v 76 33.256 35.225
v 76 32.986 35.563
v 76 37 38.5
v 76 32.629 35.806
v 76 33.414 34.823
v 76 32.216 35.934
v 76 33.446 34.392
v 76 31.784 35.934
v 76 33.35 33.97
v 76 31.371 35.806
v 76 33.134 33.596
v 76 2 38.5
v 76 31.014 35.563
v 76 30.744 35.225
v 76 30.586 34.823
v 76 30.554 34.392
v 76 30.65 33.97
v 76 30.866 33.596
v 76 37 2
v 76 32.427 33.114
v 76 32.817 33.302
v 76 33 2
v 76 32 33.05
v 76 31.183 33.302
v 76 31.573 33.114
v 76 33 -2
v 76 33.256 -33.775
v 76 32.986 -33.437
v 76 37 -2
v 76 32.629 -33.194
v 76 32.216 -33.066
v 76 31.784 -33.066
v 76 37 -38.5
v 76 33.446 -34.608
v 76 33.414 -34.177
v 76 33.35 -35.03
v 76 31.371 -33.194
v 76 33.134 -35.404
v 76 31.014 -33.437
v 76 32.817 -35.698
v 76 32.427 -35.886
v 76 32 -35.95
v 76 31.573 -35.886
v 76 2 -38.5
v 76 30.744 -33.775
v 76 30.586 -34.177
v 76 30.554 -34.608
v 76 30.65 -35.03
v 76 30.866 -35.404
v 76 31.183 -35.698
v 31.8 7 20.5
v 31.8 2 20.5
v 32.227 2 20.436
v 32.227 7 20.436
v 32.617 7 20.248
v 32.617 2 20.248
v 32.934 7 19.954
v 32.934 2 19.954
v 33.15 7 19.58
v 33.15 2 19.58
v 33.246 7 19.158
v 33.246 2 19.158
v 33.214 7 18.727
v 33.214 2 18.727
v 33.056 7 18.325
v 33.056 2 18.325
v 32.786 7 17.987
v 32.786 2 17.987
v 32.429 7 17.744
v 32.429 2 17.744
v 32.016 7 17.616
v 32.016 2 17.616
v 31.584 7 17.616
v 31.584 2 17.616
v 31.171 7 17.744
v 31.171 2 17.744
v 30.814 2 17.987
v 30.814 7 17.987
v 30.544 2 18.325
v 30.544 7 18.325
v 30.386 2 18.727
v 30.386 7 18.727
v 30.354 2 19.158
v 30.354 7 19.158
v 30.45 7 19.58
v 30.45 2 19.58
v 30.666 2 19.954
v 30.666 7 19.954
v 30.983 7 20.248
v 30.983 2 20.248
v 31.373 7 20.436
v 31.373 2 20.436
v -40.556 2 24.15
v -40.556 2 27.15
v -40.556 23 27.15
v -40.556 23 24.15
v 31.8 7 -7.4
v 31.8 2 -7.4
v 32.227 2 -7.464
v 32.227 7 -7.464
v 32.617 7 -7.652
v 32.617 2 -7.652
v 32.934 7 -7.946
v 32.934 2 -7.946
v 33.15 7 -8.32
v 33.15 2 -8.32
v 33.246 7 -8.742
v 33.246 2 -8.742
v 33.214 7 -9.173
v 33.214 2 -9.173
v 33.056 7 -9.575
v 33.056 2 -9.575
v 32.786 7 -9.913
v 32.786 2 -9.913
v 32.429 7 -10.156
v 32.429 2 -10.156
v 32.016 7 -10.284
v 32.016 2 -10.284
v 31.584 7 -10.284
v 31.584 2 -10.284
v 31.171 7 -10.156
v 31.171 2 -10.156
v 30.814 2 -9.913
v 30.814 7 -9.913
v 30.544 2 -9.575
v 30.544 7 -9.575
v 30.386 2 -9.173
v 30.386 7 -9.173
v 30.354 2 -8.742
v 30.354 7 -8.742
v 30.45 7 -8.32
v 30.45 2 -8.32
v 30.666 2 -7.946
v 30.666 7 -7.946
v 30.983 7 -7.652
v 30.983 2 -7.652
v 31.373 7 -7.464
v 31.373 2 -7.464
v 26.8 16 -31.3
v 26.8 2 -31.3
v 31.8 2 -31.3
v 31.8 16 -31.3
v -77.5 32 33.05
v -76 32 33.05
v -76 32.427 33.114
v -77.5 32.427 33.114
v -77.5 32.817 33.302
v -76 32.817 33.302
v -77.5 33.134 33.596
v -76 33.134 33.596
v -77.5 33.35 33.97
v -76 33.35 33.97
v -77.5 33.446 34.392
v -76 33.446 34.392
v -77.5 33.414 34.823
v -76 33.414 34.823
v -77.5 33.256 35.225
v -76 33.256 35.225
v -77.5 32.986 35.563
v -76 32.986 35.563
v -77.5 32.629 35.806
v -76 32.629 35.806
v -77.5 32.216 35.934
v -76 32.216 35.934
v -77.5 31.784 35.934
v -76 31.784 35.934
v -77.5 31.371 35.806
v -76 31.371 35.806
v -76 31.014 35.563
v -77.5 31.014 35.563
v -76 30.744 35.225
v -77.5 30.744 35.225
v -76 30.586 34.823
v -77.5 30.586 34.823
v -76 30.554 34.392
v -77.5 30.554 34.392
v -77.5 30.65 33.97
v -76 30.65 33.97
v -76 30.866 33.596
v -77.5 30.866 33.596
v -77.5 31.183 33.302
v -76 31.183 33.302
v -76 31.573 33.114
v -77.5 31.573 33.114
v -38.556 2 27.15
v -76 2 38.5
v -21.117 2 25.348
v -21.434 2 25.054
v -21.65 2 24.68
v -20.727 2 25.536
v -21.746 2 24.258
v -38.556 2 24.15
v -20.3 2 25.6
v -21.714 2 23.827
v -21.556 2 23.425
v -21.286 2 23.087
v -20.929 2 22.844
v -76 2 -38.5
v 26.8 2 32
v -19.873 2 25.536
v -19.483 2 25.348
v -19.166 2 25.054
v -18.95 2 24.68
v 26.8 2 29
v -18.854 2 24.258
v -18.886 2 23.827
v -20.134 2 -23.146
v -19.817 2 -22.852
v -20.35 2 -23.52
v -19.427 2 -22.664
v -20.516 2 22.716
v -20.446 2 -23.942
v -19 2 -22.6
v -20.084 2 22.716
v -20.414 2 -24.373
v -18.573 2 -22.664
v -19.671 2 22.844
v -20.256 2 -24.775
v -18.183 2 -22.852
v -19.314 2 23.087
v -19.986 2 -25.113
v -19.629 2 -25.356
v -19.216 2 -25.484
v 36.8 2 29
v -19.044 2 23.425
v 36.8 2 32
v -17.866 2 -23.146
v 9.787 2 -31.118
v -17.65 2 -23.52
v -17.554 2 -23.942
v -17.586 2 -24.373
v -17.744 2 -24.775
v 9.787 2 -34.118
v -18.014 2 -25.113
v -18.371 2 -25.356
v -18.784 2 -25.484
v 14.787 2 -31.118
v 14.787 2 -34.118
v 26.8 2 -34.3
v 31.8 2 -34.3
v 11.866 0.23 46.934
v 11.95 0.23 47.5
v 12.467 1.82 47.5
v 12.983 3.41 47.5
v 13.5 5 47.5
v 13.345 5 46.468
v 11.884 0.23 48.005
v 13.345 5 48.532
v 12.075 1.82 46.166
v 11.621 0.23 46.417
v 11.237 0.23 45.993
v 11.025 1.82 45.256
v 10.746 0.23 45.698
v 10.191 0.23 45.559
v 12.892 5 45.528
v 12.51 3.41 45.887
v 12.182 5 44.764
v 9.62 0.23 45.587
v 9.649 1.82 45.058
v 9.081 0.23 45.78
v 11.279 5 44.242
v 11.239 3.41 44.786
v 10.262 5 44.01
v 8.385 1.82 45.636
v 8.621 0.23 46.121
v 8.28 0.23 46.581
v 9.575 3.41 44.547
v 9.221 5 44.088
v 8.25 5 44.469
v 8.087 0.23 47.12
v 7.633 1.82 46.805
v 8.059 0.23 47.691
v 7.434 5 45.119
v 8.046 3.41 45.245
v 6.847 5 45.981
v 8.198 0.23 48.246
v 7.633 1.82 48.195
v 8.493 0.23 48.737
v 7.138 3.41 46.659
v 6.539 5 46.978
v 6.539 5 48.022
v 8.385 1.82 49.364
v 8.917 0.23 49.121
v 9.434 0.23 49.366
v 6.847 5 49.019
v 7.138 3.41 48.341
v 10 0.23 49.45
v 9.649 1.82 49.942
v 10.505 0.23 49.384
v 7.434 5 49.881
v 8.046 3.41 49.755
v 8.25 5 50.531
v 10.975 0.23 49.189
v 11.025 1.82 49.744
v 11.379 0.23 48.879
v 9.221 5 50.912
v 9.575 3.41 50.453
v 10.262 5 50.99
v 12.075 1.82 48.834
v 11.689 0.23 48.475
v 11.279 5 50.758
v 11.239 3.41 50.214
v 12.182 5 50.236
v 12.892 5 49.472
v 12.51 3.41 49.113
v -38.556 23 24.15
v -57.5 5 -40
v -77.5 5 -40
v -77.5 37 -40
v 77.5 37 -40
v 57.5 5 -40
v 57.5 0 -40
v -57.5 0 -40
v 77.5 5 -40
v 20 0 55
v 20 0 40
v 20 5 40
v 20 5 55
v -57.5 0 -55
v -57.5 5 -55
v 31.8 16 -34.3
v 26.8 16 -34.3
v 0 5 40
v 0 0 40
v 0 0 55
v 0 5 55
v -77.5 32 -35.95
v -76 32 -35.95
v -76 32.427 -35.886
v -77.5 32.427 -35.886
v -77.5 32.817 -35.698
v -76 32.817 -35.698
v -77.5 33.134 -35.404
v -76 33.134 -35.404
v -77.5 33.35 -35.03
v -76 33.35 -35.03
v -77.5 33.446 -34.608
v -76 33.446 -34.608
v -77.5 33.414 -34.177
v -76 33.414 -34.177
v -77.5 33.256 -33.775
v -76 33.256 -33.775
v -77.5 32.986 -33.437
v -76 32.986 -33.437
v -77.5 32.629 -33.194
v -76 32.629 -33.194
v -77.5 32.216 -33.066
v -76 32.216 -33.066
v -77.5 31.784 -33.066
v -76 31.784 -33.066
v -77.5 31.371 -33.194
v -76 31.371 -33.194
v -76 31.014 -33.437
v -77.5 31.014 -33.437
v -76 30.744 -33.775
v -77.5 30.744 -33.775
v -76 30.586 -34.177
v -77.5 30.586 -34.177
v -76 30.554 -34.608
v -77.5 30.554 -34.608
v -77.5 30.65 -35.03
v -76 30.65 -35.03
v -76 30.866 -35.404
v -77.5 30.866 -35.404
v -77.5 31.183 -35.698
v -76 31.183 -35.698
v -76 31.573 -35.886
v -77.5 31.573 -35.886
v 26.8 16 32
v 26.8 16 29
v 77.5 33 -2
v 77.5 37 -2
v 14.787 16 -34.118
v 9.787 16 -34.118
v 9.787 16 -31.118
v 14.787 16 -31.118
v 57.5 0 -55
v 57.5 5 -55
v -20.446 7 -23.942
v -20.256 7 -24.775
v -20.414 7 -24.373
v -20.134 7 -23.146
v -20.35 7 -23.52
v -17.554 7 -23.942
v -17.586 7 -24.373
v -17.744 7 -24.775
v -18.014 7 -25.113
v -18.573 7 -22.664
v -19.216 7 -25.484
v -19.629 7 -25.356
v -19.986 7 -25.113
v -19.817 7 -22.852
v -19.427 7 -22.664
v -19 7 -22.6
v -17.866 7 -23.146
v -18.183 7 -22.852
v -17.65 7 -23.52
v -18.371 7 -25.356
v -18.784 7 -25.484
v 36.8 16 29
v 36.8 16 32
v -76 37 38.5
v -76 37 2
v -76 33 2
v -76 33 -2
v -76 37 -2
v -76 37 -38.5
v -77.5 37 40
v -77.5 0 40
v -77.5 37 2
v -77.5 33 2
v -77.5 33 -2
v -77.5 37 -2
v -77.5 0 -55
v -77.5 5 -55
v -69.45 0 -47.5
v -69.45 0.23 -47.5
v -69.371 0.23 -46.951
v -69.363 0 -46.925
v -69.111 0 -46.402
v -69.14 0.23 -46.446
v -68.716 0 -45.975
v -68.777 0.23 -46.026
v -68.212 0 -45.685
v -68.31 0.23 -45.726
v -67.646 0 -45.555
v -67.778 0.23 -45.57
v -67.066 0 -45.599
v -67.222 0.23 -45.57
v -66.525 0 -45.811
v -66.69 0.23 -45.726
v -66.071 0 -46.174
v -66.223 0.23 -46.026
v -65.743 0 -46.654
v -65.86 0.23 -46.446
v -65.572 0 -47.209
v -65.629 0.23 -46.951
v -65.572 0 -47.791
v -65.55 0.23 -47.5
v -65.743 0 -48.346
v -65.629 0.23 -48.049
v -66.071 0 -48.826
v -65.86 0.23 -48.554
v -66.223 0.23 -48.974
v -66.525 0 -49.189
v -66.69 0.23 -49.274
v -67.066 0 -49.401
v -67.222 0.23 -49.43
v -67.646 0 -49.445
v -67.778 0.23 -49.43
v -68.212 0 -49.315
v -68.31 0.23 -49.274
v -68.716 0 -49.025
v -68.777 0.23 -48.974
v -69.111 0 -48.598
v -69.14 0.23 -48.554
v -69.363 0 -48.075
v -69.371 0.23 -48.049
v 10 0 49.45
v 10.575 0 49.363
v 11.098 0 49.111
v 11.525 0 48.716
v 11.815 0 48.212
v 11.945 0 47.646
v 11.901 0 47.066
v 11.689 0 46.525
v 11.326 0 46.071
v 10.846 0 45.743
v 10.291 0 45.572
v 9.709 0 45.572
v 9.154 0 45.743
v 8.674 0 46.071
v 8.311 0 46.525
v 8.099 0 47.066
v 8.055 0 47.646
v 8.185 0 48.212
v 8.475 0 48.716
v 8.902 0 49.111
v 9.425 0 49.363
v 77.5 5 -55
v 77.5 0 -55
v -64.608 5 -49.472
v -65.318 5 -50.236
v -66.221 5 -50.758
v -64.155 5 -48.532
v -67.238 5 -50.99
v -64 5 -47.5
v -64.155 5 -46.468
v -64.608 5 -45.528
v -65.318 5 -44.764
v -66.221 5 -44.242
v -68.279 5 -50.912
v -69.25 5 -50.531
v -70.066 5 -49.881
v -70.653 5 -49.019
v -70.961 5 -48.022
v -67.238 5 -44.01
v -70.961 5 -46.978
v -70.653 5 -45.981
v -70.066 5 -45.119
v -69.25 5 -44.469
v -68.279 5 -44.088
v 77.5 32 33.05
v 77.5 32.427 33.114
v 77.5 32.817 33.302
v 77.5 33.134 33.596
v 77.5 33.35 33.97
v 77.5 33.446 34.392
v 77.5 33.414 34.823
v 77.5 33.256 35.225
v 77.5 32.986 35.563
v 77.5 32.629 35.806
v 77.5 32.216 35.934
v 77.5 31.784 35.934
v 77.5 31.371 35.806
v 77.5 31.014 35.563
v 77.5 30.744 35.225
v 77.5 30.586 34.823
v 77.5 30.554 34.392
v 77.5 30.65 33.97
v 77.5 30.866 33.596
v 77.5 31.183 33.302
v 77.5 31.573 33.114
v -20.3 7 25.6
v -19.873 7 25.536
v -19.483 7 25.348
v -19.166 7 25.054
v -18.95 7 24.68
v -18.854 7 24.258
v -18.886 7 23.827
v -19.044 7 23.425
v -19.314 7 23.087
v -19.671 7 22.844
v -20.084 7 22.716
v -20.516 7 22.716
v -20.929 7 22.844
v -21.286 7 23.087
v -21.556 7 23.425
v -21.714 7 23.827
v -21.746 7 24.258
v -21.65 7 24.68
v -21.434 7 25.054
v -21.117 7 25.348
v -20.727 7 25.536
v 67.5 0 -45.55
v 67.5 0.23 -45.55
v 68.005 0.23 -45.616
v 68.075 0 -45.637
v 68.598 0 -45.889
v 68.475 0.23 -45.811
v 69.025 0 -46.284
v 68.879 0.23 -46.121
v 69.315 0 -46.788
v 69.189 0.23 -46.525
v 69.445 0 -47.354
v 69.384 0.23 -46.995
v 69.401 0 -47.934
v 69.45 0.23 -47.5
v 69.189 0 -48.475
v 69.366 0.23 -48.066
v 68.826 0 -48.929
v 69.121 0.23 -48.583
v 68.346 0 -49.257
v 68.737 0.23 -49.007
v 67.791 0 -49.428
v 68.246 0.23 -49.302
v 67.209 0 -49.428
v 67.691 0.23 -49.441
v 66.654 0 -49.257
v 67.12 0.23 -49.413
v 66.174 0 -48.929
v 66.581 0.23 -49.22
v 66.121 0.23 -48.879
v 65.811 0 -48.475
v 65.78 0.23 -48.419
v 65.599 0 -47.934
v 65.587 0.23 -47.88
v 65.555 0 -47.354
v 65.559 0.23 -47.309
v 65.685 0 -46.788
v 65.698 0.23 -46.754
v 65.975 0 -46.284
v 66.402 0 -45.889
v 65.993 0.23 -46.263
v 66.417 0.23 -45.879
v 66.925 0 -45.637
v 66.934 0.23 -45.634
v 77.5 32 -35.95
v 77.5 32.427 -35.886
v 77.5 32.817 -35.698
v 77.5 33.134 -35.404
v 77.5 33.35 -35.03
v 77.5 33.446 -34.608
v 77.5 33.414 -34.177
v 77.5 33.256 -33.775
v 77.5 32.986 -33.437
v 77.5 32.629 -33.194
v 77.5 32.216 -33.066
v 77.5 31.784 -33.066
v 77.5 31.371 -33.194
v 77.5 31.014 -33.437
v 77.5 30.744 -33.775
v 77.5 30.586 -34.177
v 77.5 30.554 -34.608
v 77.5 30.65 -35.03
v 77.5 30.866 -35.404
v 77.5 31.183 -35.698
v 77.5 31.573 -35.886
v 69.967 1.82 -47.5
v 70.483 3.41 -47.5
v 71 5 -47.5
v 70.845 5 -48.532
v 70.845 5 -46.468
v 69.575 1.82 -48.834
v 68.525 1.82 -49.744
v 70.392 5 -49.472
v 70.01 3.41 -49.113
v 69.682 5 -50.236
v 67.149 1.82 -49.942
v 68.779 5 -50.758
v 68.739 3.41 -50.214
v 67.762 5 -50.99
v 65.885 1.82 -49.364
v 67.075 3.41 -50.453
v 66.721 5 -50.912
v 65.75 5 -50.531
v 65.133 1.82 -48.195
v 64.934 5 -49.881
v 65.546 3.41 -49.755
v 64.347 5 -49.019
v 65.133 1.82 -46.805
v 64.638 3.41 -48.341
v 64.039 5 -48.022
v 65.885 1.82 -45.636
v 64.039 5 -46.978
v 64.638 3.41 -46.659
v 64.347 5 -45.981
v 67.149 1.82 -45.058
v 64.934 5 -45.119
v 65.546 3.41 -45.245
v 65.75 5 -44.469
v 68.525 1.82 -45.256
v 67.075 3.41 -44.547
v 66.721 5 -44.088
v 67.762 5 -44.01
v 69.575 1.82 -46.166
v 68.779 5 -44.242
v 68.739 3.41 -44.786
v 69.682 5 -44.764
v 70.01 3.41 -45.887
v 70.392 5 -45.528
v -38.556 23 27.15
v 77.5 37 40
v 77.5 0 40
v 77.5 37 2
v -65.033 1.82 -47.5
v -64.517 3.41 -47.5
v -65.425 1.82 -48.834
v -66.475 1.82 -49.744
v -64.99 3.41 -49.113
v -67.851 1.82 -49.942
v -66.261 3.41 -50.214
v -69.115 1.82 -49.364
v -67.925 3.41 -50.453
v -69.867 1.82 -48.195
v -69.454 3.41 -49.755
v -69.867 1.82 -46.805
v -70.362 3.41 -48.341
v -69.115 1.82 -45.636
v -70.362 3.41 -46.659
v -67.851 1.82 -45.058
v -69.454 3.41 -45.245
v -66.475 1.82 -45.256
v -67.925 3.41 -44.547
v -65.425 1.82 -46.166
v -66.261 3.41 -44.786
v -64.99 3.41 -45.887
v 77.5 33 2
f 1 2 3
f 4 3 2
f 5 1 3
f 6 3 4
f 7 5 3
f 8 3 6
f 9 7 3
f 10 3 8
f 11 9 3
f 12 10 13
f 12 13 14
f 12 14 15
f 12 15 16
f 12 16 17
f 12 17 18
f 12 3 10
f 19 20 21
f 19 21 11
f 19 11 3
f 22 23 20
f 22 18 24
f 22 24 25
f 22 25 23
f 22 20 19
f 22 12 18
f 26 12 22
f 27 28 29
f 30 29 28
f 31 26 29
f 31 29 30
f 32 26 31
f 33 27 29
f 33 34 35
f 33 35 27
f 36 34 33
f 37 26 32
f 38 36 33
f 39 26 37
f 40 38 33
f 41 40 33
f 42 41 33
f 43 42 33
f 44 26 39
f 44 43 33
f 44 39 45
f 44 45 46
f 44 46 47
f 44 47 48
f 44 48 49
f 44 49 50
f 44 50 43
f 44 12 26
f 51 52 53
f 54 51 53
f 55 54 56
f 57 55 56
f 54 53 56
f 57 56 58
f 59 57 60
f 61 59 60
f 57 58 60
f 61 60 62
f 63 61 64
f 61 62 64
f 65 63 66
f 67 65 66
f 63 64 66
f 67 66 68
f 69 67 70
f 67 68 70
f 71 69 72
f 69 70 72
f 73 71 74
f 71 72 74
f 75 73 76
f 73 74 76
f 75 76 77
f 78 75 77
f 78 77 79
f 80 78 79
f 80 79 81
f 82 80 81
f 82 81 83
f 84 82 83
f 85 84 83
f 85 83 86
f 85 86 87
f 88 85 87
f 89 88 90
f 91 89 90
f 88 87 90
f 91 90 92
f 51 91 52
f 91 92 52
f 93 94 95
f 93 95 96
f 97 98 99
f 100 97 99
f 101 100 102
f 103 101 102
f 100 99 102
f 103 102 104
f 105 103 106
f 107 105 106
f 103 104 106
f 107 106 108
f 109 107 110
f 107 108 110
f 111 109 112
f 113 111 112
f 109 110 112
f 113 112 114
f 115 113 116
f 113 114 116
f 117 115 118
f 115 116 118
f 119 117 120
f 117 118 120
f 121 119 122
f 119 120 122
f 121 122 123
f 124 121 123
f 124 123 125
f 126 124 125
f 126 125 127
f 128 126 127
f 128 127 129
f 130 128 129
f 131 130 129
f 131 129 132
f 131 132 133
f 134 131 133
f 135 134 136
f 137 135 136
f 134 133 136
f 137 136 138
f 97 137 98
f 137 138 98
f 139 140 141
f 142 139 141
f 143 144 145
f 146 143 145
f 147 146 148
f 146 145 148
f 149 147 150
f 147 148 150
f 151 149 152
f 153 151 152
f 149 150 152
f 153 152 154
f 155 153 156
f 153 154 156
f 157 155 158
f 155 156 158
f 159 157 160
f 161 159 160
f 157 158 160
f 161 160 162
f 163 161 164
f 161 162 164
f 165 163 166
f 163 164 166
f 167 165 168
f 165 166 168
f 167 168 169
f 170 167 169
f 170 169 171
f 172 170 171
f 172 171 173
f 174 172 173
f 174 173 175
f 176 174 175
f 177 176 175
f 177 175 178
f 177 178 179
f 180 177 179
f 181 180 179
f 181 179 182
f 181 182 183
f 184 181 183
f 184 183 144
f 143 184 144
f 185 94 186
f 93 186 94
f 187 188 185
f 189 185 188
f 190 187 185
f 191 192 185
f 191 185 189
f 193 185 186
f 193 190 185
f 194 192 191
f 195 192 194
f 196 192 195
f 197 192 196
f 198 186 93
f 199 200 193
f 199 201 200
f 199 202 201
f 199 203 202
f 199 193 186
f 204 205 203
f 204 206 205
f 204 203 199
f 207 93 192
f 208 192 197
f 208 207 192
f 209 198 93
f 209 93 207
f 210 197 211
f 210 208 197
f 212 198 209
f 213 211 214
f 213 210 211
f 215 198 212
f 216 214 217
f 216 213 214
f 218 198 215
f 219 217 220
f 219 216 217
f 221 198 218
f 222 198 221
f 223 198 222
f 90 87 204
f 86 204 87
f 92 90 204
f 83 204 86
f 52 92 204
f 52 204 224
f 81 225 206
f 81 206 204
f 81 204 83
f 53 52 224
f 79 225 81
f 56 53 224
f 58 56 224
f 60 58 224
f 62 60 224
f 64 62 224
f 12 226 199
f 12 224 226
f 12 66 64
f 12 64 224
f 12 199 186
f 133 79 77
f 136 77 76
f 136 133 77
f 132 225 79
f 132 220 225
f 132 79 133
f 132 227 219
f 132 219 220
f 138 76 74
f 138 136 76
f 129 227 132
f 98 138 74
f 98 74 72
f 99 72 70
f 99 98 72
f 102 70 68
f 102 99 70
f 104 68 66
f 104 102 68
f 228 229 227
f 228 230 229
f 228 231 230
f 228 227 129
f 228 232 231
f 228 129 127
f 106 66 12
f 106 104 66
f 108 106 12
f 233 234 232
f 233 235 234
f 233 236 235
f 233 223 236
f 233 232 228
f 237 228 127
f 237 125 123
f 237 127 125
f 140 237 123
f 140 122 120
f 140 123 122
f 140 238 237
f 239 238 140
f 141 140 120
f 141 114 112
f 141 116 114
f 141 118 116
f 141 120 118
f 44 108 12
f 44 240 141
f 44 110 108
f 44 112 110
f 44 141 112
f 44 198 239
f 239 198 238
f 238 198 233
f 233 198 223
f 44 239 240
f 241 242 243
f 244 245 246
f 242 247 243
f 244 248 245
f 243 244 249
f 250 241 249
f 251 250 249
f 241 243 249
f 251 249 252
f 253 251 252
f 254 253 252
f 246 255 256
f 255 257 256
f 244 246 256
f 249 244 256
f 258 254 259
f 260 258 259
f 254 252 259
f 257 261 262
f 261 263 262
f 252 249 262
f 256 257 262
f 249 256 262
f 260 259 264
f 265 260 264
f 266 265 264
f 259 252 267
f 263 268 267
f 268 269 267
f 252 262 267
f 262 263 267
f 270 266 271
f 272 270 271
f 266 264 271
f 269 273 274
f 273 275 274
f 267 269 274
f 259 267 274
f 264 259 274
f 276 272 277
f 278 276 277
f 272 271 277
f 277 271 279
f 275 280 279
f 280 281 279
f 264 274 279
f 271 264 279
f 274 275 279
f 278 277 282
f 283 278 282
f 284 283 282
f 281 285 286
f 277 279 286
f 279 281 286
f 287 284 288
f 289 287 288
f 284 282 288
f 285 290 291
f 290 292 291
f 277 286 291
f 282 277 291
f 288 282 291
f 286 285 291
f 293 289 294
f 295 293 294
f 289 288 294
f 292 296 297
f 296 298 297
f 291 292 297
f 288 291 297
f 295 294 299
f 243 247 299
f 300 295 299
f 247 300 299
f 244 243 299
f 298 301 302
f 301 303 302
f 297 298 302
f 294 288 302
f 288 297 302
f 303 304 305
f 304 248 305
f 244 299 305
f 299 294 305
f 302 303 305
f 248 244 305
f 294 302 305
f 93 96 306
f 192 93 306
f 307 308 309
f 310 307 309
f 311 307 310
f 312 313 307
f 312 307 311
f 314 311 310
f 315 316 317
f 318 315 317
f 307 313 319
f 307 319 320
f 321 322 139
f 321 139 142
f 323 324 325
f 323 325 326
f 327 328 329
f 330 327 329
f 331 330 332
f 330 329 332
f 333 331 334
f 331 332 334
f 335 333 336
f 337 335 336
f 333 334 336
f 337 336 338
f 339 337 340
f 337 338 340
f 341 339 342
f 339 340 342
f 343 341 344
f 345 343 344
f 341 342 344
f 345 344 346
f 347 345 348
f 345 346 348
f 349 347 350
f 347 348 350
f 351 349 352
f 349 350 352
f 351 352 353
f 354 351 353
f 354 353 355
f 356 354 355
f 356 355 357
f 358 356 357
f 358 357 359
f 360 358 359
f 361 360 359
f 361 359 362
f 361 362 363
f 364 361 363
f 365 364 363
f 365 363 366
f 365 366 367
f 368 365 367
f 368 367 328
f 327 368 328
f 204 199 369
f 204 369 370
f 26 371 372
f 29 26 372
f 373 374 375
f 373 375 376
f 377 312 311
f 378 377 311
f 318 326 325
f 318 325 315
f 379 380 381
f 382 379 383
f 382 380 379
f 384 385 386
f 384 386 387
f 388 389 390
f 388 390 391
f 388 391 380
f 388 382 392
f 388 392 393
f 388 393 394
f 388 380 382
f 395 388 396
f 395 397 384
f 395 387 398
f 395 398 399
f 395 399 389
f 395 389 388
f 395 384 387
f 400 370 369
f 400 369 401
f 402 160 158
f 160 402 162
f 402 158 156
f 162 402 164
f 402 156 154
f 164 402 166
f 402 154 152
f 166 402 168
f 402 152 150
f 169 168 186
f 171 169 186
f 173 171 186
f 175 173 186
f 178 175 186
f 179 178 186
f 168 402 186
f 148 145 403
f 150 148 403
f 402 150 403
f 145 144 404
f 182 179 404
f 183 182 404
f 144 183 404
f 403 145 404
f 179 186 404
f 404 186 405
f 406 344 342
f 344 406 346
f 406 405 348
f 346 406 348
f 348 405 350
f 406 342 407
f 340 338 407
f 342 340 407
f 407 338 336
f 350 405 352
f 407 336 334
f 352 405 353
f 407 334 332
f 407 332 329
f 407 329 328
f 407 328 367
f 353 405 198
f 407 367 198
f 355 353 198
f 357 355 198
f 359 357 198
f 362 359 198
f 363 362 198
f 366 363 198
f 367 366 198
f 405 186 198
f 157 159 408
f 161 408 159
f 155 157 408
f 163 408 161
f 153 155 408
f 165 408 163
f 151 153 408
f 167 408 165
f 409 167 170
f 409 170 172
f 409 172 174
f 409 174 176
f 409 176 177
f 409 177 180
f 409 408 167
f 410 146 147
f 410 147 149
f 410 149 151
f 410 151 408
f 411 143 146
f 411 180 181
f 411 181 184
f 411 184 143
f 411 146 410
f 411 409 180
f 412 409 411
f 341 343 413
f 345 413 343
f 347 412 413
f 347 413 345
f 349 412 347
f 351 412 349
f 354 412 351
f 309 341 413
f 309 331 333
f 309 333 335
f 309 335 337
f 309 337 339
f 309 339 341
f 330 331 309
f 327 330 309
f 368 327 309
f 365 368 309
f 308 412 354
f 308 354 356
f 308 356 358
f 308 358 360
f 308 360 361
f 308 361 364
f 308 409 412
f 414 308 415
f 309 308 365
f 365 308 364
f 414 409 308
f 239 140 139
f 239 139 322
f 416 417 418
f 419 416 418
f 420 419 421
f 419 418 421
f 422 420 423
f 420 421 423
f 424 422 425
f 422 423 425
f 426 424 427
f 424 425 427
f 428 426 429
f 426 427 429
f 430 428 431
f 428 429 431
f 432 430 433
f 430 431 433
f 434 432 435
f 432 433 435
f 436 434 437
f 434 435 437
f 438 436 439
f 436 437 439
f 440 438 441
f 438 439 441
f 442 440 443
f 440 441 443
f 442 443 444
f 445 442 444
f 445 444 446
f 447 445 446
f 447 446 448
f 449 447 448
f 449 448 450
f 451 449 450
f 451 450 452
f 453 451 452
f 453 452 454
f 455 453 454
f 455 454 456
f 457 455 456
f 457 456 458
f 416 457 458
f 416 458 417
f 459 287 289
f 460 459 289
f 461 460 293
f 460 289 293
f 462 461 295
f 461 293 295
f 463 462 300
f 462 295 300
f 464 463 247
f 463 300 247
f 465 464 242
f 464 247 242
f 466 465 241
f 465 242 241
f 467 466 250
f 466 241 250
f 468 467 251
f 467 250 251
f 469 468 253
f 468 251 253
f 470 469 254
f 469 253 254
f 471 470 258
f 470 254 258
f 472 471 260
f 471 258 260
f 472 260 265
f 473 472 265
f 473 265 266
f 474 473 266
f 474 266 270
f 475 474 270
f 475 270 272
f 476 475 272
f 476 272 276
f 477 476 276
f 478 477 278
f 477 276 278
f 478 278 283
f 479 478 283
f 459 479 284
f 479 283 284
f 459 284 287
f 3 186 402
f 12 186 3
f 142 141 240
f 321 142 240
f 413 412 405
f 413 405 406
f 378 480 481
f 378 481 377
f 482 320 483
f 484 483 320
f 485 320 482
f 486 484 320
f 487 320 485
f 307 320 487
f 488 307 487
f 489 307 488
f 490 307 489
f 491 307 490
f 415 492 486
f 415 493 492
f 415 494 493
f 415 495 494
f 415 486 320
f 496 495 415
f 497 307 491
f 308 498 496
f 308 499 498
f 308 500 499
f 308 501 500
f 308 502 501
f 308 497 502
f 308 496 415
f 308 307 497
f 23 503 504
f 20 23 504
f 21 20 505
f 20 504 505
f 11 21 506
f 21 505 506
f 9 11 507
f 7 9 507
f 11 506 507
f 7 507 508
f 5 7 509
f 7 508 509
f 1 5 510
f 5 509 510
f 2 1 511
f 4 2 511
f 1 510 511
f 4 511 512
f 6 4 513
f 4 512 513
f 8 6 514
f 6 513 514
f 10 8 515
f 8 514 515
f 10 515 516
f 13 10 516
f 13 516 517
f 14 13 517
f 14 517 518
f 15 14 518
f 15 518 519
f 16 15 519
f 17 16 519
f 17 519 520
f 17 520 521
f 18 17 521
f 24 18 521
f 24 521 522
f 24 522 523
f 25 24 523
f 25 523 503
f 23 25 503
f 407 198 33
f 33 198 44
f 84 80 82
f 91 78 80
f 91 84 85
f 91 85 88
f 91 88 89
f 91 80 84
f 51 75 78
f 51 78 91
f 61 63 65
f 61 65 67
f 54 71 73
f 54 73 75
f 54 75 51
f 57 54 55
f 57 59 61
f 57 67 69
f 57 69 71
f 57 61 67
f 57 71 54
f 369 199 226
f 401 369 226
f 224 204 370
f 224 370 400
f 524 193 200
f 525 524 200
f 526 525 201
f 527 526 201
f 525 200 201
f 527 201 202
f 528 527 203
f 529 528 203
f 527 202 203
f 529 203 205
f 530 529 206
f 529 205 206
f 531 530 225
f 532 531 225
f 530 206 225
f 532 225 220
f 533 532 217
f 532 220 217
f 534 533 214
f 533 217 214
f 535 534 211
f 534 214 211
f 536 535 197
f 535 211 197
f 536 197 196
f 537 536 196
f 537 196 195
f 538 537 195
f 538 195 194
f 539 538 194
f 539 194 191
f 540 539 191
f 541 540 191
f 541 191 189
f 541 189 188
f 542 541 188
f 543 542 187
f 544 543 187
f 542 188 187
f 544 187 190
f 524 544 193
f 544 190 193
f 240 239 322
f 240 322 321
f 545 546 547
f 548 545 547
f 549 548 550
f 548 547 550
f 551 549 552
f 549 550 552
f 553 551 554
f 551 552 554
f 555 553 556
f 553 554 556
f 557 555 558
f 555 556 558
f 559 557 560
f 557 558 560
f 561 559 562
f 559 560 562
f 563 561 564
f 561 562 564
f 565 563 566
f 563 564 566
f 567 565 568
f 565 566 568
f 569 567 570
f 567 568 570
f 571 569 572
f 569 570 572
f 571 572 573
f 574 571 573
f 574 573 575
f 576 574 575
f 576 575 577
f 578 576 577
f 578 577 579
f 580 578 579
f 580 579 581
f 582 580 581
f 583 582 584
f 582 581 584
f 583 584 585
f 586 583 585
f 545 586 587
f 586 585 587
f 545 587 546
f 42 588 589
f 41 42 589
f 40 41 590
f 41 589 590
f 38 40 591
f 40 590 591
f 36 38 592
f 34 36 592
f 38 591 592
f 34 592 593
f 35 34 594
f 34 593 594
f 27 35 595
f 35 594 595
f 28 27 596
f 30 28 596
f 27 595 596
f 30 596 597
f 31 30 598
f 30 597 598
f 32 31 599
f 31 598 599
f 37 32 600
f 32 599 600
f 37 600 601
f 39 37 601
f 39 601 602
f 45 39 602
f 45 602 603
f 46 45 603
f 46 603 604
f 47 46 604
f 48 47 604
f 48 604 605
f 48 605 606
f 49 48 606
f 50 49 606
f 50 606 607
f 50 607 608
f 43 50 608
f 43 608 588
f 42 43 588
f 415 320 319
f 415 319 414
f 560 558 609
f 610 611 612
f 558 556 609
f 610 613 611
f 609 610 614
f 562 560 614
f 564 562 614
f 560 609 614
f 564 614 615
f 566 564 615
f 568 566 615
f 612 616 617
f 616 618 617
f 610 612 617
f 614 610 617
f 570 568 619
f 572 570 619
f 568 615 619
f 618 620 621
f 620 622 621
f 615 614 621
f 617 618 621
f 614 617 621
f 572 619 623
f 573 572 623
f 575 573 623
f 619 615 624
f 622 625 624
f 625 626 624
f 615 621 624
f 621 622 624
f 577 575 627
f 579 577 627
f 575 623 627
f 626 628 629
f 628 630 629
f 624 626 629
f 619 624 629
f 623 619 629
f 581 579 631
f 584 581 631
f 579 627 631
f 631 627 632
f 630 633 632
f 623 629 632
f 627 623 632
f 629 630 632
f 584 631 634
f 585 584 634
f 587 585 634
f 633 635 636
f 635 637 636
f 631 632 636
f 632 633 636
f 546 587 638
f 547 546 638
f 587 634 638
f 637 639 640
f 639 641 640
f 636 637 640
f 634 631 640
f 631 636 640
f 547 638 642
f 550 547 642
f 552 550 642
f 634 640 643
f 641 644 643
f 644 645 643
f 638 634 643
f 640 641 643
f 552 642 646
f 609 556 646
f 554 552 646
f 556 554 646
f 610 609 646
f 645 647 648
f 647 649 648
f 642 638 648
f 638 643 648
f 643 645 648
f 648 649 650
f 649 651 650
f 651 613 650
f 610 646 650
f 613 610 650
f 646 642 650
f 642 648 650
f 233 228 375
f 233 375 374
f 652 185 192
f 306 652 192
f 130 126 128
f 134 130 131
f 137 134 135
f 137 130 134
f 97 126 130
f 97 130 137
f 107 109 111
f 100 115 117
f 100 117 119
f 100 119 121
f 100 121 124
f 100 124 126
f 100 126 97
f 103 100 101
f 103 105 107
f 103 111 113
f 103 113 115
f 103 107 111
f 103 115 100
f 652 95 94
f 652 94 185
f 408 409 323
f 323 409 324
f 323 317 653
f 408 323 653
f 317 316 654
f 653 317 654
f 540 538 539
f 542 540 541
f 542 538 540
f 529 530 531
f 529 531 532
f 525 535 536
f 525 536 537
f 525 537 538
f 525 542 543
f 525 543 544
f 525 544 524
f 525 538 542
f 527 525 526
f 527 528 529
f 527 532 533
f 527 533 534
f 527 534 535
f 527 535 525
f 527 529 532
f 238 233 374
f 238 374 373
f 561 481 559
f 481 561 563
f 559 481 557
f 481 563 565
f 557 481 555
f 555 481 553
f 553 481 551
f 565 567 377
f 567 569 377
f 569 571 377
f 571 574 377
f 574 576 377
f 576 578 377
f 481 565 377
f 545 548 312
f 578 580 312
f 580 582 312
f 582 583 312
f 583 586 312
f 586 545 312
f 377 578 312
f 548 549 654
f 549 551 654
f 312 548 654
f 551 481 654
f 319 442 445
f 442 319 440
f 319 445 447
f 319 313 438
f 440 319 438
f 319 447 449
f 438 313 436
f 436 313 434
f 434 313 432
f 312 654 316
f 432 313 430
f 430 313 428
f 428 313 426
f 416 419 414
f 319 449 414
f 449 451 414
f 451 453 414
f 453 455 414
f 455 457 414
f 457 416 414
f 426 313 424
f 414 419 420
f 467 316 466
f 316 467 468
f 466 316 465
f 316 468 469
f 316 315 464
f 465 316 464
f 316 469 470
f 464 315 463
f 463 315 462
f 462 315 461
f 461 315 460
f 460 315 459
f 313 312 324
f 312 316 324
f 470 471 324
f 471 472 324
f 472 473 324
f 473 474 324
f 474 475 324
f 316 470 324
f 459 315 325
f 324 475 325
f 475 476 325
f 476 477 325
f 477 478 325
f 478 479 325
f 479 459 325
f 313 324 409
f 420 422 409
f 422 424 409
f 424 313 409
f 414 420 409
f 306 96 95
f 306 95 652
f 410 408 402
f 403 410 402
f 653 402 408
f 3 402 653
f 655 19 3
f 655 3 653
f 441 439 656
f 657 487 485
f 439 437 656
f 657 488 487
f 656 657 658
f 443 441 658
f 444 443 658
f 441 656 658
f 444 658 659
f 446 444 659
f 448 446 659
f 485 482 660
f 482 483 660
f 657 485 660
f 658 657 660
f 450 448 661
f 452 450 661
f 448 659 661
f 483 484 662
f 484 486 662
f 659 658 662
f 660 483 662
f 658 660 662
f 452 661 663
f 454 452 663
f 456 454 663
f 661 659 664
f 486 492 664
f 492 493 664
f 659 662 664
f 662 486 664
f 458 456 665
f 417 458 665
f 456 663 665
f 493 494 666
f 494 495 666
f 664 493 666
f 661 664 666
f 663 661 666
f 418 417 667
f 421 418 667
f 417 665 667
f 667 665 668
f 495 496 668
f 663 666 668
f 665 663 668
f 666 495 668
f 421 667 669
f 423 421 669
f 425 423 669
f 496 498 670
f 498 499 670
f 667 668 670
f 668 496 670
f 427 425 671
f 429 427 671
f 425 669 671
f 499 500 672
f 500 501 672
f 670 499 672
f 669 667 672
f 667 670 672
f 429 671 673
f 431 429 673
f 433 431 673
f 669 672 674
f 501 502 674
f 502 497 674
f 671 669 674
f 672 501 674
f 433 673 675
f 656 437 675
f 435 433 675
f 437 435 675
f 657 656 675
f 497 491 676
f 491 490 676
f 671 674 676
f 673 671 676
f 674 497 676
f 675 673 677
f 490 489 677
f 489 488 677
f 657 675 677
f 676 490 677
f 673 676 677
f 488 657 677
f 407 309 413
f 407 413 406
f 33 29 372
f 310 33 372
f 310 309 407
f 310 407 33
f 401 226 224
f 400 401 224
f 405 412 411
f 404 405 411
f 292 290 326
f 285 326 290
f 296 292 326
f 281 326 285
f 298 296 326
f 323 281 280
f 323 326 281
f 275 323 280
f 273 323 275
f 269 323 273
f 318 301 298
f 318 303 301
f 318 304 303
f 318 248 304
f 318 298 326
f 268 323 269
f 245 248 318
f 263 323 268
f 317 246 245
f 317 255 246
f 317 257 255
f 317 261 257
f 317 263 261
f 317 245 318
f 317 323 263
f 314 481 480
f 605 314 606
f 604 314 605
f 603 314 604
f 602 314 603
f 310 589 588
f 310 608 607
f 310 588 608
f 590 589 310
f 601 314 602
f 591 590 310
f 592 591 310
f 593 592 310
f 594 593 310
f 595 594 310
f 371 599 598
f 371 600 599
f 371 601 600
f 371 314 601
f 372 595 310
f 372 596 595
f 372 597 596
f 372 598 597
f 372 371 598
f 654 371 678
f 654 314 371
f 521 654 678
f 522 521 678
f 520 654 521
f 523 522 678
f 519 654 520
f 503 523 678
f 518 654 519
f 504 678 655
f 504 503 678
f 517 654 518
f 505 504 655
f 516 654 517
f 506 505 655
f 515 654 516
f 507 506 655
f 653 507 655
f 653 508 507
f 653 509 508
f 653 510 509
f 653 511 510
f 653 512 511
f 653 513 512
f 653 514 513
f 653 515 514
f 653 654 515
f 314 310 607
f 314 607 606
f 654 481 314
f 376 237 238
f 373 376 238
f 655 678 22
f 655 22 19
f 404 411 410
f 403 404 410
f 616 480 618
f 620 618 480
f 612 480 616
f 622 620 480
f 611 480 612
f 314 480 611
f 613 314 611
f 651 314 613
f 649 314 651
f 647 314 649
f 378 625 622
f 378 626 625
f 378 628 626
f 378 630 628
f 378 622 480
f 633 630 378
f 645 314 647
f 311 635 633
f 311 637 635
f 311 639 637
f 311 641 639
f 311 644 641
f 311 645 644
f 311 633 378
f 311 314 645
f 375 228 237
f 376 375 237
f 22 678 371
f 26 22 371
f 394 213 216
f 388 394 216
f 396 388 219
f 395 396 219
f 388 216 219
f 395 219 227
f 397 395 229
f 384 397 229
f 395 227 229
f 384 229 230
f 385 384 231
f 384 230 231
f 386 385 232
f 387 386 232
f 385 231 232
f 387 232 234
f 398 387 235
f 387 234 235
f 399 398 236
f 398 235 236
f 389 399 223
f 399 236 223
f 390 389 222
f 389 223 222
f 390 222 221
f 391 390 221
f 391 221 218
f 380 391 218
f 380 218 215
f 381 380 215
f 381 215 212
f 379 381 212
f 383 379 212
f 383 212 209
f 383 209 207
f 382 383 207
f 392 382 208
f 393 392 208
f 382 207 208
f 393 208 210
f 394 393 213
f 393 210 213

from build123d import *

# Parameters (mm, degrees)
SKETCH1_W            = 155
SKETCH1_H            = 80
BOSS_EXTRUDE1_DEPTH  = 2
SKETCH3_R            = 1.45
BOSS_EXTRUDE2_DEPTH  = 5
SKETCH4_W            = 5
SKETCH4_H            = 3
BOSS_EXTRUDE3_DEPTH  = 14
SKETCH5_W            = 5
SKETCH5_H            = 3
BOSS_EXTRUDE4_DEPTH  = 14
SKETCH6_W            = 10
SKETCH6_H            = 3
BOSS_EXTRUDE5_DEPTH  = 14
SKETCH7_W            = 2
SKETCH7_H            = 3
BOSS_EXTRUDE6_DEPTH  = 21
SKETCH8_W            = 155
SKETCH8_H            = 1.5
BOSS_EXTRUDE7_DEPTH  = 35
SKETCH9_W            = 155
SKETCH9_H            = 1.5
BOSS_EXTRUDE8_DEPTH  = 35
SKETCH10_W           = 1.5
SKETCH10_H           = 77
BOSS_EXTRUDE9_DEPTH  = 35
SKETCH11_W           = 1.5
SKETCH11_H           = 77
BOSS_EXTRUDE10_DEPTH = 35
SKETCH12_W           = 4
SKETCH12_H           = 8
CUT_EXTRUDE1_DEPTH   = 5
SKETCH13_W           = 4
SKETCH13_H           = 8
CUT_EXTRUDE2_DEPTH   = 5
SKETCH14_W           = 20
SKETCH14_H           = 5
BOSS_EXTRUDE11_DEPTH = 15
SKETCH15_W           = 20
SKETCH15_H           = 5
BOSS_EXTRUDE12_DEPTH = 15
SKETCH16_R           = 1.95
CUT_EXTRUDE3_DEPTH   = 5
SKETCH17_R           = 3.5
CUT_EXTRUDE4_DEPTH   = 10
CUT_EXTRUDE4_DRAFT   = -18
SKETCH18_R           = 1.95
CUT_EXTRUDE5_DEPTH   = 10
SKETCH19_R           = 3.5
CUT_EXTRUDE6_DEPTH   = 10
CUT_EXTRUDE6_DRAFT   = -18
SKETCH20_R           = 1.95
CUT_EXTRUDE7_DEPTH   = 10
SKETCH21_R           = 3.5
CUT_EXTRUDE8_DEPTH   = 10
CUT_EXTRUDE8_DRAFT   = -18
SKETCH22_R           = 1.45
CUT_EXTRUDE9_DEPTH   = 200
SKETCH23_R           = 1.45
CUT_EXTRUDE10_DEPTH  = 200


with BuildPart() as part:
    # Sketch1 → Boss-Extrude1 (new body)
    with BuildSketch(Plane(origin=(0, 0, 0), x_dir=(1, 0, 0), z_dir=(0, 1, 0))):
        Rectangle(SKETCH1_W, SKETCH1_H)
    extrude(amount=BOSS_EXTRUDE1_DEPTH)

    # Sketch3 → Boss-Extrude2 (add)
    with BuildSketch(Plane(origin=(0, 2, 0), x_dir=(1, 0, 0), z_dir=(0, 1, 0))):
        with Locations(Location((-20.3, -24.15, 0), (0, 0, 270))):
            Circle(SKETCH3_R)
        with Locations(Location((-19, 24.05, 0), (0, 0, 270))):
            Circle(SKETCH3_R)
        with Locations(Location((31.8, 8.85, 0), (0, 0, 270))):
            Circle(SKETCH3_R)
        with Locations(Location((31.8, -19.05, 0), (0, 0, 270))):
            Circle(SKETCH3_R)
    extrude(amount=BOSS_EXTRUDE2_DEPTH)

    # Sketch4 → Boss-Extrude3 (add)
    with BuildSketch(Plane(origin=(0, 2, 0), x_dir=(1, 0, 0), z_dir=(0, 1, 0))):
        with Locations((29.3, 32.8)):
            Rectangle(SKETCH4_W, SKETCH4_H)
    extrude(amount=BOSS_EXTRUDE3_DEPTH)

    # Sketch5 → Boss-Extrude4 (add)
    with BuildSketch(Plane(origin=(0, 2, 0), x_dir=(1, 0, 0), z_dir=(0, 1, 0))):
        with Locations((12.287448128, 32.618143972)):
            Rectangle(SKETCH5_W, SKETCH5_H)
    extrude(amount=BOSS_EXTRUDE4_DEPTH)

    # Sketch6 → Boss-Extrude5 (add)
    with BuildSketch(Plane(origin=(0, 2, 0), x_dir=(1, 0, 0), z_dir=(0, 1, 0))):
        with Locations((31.8, -30.5)):
            Rectangle(SKETCH6_W, SKETCH6_H)
    extrude(amount=BOSS_EXTRUDE5_DEPTH)

    # Sketch7 → Boss-Extrude6 (add)
    with BuildSketch(Plane(origin=(0, 2, 0), x_dir=(1, 0, 0), z_dir=(0, 1, 0))):
        with Locations((-39.555823147, -25.65)):
            Rectangle(SKETCH7_W, SKETCH7_H)
    extrude(amount=BOSS_EXTRUDE6_DEPTH)

    # Sketch8 → Boss-Extrude7 (add)
    with BuildSketch(Plane(origin=(0, 2, 0), x_dir=(1, 0, 0), z_dir=(0, 1, 0))):
        with Locations((0, 39.25)):
            Rectangle(SKETCH8_W, SKETCH8_H)
    extrude(amount=BOSS_EXTRUDE7_DEPTH)

    # Sketch9 → Boss-Extrude8 (add)
    with BuildSketch(Plane(origin=(0, 2, 0), x_dir=(1, 0, 0), z_dir=(0, 1, 0))):
        with Locations((0, -39.25)):
            Rectangle(SKETCH9_W, SKETCH9_H)
    extrude(amount=BOSS_EXTRUDE8_DEPTH)

    # Sketch10 → Boss-Extrude9 (add)
    with BuildSketch(Plane(origin=(0, 2, 0), x_dir=(1, 0, 0), z_dir=(0, 1, 0))):
        with Locations((76.75, 0)):
            Rectangle(SKETCH10_W, SKETCH10_H)
    extrude(amount=BOSS_EXTRUDE9_DEPTH)

    # Sketch11 → Boss-Extrude10 (add)
    with BuildSketch(Plane(origin=(0, 2, 0), x_dir=(1, 0, 0), z_dir=(0, 1, 0))):
        with Locations((-76.75, 0)):
            Rectangle(SKETCH11_W, SKETCH11_H)
    extrude(amount=BOSS_EXTRUDE10_DEPTH)

    # Sketch12 → Cut-Extrude1 (cut)
    with BuildSketch(Plane.ZY.offset(77.5)):
        with Locations((0, 37)):
            Rectangle(SKETCH12_W, SKETCH12_H)
    extrude(amount=-CUT_EXTRUDE1_DEPTH, mode=Mode.SUBTRACT)

    # Sketch13 → Cut-Extrude2 (cut)
    with BuildSketch(Plane(origin=(77.5, 0, 0), x_dir=(0, 0, -1), z_dir=(1, 0, 0))):
        with Locations((0, 37)):
            Rectangle(SKETCH13_W, SKETCH13_H)
    extrude(amount=-CUT_EXTRUDE2_DEPTH, mode=Mode.SUBTRACT)

    # Sketch14 → Boss-Extrude11 (add)
    with BuildSketch(Plane(origin=(0, 0, -40), x_dir=(-1, 0, 0), z_dir=(0, 0, -1))):
        with Locations((-67.5, 2.5)):
            Rectangle(SKETCH14_W, SKETCH14_H)
        with Locations((67.5, 2.5)):
            Rectangle(SKETCH14_W, SKETCH14_H)
    extrude(amount=BOSS_EXTRUDE11_DEPTH)

    # Sketch15 → Boss-Extrude12 (add)
    with BuildSketch(Plane.XY.offset(40)):
        with Locations((10, 2.5)):
            Rectangle(SKETCH15_W, SKETCH15_H)
    extrude(amount=BOSS_EXTRUDE12_DEPTH)

    # Sketch16 → Cut-Extrude3 (cut)
    with BuildSketch(Plane(origin=(0, 5, 0), x_dir=(1, 0, 0), z_dir=(0, 1, 0))):
        with Locations(Location((67.5, 47.5, 0), (0, 0, 270))):
            Circle(SKETCH16_R)
    extrude(amount=-CUT_EXTRUDE3_DEPTH, mode=Mode.SUBTRACT)


with BuildPart() as cut_extrude4_tool:
    # Sketch17 → Cut-Extrude4 (with draft: the straight prism first)
    with BuildSketch(Plane(origin=(0, 5, 0), x_dir=(1, 0, 0), z_dir=(0, 1, 0))):
        with Locations((67.5, 47.5)):
            Circle(SKETCH17_R)
    extrude(amount=-CUT_EXTRUDE4_DEPTH)
    # Cut-Extrude4: the draft: its side faces are tilted about the plane it starts from
    cut_extrude4_sides = [cut_extrude4_tool.faces().sort_by_distance(p)[0] for p in [
        (64, 0, -47.5),
    ]]
    draft(cut_extrude4_sides, Plane(origin=(0, 5, 0), x_dir=(1, 0, 0), z_dir=(0, 1, 0)), CUT_EXTRUDE4_DRAFT)


with BuildPart() as part_1:
    add(part.part)

    # Cut-Extrude4: cut by cut_extrude4_tool
    add(cut_extrude4_tool.part, mode=Mode.SUBTRACT)

    # Sketch18 → Cut-Extrude5 (cut)
    with BuildSketch(Plane(origin=(0, 5, 0), x_dir=(1, 0, 0), z_dir=(0, 1, 0))):
        with Locations(Location((-67.5, 47.5, 0), (0, 0, 180))):
            Circle(SKETCH18_R)
    extrude(amount=-CUT_EXTRUDE5_DEPTH, mode=Mode.SUBTRACT)


with BuildPart() as cut_extrude6_tool:
    # Sketch19 → Cut-Extrude6 (with draft: the straight prism first)
    with BuildSketch(Plane(origin=(0, 5, 0), x_dir=(1, 0, 0), z_dir=(0, 1, 0))):
        with Locations((-67.5, 47.5)):
            Circle(SKETCH19_R)
    extrude(amount=-CUT_EXTRUDE6_DEPTH)
    # Cut-Extrude6: the draft: its side faces are tilted about the plane it starts from
    cut_extrude6_sides = [cut_extrude6_tool.faces().sort_by_distance(p)[0] for p in [
        (-71, 0, -47.5),
    ]]
    draft(cut_extrude6_sides, Plane(origin=(0, 5, 0), x_dir=(1, 0, 0), z_dir=(0, 1, 0)), CUT_EXTRUDE6_DRAFT)


with BuildPart() as part_2:
    add(part_1.part)

    # Cut-Extrude6: cut by cut_extrude6_tool
    add(cut_extrude6_tool.part, mode=Mode.SUBTRACT)

    # Sketch20 → Cut-Extrude7 (cut)
    with BuildSketch(Plane(origin=(0, 5, 0), x_dir=(1, 0, 0), z_dir=(0, 1, 0))):
        with Locations(Location((10, -47.5, 0), (0, 0, 270))):
            Circle(SKETCH20_R)
    extrude(amount=-CUT_EXTRUDE7_DEPTH, mode=Mode.SUBTRACT)


with BuildPart() as cut_extrude8_tool:
    # Sketch21 → Cut-Extrude8 (with draft: the straight prism first)
    with BuildSketch(Plane(origin=(0, 5, 0), x_dir=(1, 0, 0), z_dir=(0, 1, 0))):
        with Locations((10, -47.5)):
            Circle(SKETCH21_R)
    extrude(amount=-CUT_EXTRUDE8_DEPTH)
    # Cut-Extrude8: the draft: its side faces are tilted about the plane it starts from
    cut_extrude8_sides = [cut_extrude8_tool.faces().sort_by_distance(p)[0] for p in [
        (6.5, 0, 47.5),
    ]]
    draft(cut_extrude8_sides, Plane(origin=(0, 5, 0), x_dir=(1, 0, 0), z_dir=(0, 1, 0)), CUT_EXTRUDE8_DRAFT)


with BuildPart() as part_3:
    add(part_2.part)

    # Cut-Extrude8: cut by cut_extrude8_tool
    add(cut_extrude8_tool.part, mode=Mode.SUBTRACT)

    # Sketch22 → Cut-Extrude9 (cut)
    with BuildSketch(Plane(origin=(77.5, 0, 0), x_dir=(0, 0, -1), z_dir=(1, 0, 0))):
        with Locations((-34.5, 32)):
            Circle(SKETCH22_R)
    extrude(amount=-CUT_EXTRUDE9_DEPTH, mode=Mode.SUBTRACT)

    # Sketch23 → Cut-Extrude10 (cut)
    with BuildSketch(Plane(origin=(77.5, 0, 0), x_dir=(0, 0, -1), z_dir=(1, 0, 0))):
        with Locations((34.5, 32)):
            Circle(SKETCH23_R)
    extrude(amount=-CUT_EXTRUDE10_DEPTH, mode=Mode.SUBTRACT)


solid = part_3.part
